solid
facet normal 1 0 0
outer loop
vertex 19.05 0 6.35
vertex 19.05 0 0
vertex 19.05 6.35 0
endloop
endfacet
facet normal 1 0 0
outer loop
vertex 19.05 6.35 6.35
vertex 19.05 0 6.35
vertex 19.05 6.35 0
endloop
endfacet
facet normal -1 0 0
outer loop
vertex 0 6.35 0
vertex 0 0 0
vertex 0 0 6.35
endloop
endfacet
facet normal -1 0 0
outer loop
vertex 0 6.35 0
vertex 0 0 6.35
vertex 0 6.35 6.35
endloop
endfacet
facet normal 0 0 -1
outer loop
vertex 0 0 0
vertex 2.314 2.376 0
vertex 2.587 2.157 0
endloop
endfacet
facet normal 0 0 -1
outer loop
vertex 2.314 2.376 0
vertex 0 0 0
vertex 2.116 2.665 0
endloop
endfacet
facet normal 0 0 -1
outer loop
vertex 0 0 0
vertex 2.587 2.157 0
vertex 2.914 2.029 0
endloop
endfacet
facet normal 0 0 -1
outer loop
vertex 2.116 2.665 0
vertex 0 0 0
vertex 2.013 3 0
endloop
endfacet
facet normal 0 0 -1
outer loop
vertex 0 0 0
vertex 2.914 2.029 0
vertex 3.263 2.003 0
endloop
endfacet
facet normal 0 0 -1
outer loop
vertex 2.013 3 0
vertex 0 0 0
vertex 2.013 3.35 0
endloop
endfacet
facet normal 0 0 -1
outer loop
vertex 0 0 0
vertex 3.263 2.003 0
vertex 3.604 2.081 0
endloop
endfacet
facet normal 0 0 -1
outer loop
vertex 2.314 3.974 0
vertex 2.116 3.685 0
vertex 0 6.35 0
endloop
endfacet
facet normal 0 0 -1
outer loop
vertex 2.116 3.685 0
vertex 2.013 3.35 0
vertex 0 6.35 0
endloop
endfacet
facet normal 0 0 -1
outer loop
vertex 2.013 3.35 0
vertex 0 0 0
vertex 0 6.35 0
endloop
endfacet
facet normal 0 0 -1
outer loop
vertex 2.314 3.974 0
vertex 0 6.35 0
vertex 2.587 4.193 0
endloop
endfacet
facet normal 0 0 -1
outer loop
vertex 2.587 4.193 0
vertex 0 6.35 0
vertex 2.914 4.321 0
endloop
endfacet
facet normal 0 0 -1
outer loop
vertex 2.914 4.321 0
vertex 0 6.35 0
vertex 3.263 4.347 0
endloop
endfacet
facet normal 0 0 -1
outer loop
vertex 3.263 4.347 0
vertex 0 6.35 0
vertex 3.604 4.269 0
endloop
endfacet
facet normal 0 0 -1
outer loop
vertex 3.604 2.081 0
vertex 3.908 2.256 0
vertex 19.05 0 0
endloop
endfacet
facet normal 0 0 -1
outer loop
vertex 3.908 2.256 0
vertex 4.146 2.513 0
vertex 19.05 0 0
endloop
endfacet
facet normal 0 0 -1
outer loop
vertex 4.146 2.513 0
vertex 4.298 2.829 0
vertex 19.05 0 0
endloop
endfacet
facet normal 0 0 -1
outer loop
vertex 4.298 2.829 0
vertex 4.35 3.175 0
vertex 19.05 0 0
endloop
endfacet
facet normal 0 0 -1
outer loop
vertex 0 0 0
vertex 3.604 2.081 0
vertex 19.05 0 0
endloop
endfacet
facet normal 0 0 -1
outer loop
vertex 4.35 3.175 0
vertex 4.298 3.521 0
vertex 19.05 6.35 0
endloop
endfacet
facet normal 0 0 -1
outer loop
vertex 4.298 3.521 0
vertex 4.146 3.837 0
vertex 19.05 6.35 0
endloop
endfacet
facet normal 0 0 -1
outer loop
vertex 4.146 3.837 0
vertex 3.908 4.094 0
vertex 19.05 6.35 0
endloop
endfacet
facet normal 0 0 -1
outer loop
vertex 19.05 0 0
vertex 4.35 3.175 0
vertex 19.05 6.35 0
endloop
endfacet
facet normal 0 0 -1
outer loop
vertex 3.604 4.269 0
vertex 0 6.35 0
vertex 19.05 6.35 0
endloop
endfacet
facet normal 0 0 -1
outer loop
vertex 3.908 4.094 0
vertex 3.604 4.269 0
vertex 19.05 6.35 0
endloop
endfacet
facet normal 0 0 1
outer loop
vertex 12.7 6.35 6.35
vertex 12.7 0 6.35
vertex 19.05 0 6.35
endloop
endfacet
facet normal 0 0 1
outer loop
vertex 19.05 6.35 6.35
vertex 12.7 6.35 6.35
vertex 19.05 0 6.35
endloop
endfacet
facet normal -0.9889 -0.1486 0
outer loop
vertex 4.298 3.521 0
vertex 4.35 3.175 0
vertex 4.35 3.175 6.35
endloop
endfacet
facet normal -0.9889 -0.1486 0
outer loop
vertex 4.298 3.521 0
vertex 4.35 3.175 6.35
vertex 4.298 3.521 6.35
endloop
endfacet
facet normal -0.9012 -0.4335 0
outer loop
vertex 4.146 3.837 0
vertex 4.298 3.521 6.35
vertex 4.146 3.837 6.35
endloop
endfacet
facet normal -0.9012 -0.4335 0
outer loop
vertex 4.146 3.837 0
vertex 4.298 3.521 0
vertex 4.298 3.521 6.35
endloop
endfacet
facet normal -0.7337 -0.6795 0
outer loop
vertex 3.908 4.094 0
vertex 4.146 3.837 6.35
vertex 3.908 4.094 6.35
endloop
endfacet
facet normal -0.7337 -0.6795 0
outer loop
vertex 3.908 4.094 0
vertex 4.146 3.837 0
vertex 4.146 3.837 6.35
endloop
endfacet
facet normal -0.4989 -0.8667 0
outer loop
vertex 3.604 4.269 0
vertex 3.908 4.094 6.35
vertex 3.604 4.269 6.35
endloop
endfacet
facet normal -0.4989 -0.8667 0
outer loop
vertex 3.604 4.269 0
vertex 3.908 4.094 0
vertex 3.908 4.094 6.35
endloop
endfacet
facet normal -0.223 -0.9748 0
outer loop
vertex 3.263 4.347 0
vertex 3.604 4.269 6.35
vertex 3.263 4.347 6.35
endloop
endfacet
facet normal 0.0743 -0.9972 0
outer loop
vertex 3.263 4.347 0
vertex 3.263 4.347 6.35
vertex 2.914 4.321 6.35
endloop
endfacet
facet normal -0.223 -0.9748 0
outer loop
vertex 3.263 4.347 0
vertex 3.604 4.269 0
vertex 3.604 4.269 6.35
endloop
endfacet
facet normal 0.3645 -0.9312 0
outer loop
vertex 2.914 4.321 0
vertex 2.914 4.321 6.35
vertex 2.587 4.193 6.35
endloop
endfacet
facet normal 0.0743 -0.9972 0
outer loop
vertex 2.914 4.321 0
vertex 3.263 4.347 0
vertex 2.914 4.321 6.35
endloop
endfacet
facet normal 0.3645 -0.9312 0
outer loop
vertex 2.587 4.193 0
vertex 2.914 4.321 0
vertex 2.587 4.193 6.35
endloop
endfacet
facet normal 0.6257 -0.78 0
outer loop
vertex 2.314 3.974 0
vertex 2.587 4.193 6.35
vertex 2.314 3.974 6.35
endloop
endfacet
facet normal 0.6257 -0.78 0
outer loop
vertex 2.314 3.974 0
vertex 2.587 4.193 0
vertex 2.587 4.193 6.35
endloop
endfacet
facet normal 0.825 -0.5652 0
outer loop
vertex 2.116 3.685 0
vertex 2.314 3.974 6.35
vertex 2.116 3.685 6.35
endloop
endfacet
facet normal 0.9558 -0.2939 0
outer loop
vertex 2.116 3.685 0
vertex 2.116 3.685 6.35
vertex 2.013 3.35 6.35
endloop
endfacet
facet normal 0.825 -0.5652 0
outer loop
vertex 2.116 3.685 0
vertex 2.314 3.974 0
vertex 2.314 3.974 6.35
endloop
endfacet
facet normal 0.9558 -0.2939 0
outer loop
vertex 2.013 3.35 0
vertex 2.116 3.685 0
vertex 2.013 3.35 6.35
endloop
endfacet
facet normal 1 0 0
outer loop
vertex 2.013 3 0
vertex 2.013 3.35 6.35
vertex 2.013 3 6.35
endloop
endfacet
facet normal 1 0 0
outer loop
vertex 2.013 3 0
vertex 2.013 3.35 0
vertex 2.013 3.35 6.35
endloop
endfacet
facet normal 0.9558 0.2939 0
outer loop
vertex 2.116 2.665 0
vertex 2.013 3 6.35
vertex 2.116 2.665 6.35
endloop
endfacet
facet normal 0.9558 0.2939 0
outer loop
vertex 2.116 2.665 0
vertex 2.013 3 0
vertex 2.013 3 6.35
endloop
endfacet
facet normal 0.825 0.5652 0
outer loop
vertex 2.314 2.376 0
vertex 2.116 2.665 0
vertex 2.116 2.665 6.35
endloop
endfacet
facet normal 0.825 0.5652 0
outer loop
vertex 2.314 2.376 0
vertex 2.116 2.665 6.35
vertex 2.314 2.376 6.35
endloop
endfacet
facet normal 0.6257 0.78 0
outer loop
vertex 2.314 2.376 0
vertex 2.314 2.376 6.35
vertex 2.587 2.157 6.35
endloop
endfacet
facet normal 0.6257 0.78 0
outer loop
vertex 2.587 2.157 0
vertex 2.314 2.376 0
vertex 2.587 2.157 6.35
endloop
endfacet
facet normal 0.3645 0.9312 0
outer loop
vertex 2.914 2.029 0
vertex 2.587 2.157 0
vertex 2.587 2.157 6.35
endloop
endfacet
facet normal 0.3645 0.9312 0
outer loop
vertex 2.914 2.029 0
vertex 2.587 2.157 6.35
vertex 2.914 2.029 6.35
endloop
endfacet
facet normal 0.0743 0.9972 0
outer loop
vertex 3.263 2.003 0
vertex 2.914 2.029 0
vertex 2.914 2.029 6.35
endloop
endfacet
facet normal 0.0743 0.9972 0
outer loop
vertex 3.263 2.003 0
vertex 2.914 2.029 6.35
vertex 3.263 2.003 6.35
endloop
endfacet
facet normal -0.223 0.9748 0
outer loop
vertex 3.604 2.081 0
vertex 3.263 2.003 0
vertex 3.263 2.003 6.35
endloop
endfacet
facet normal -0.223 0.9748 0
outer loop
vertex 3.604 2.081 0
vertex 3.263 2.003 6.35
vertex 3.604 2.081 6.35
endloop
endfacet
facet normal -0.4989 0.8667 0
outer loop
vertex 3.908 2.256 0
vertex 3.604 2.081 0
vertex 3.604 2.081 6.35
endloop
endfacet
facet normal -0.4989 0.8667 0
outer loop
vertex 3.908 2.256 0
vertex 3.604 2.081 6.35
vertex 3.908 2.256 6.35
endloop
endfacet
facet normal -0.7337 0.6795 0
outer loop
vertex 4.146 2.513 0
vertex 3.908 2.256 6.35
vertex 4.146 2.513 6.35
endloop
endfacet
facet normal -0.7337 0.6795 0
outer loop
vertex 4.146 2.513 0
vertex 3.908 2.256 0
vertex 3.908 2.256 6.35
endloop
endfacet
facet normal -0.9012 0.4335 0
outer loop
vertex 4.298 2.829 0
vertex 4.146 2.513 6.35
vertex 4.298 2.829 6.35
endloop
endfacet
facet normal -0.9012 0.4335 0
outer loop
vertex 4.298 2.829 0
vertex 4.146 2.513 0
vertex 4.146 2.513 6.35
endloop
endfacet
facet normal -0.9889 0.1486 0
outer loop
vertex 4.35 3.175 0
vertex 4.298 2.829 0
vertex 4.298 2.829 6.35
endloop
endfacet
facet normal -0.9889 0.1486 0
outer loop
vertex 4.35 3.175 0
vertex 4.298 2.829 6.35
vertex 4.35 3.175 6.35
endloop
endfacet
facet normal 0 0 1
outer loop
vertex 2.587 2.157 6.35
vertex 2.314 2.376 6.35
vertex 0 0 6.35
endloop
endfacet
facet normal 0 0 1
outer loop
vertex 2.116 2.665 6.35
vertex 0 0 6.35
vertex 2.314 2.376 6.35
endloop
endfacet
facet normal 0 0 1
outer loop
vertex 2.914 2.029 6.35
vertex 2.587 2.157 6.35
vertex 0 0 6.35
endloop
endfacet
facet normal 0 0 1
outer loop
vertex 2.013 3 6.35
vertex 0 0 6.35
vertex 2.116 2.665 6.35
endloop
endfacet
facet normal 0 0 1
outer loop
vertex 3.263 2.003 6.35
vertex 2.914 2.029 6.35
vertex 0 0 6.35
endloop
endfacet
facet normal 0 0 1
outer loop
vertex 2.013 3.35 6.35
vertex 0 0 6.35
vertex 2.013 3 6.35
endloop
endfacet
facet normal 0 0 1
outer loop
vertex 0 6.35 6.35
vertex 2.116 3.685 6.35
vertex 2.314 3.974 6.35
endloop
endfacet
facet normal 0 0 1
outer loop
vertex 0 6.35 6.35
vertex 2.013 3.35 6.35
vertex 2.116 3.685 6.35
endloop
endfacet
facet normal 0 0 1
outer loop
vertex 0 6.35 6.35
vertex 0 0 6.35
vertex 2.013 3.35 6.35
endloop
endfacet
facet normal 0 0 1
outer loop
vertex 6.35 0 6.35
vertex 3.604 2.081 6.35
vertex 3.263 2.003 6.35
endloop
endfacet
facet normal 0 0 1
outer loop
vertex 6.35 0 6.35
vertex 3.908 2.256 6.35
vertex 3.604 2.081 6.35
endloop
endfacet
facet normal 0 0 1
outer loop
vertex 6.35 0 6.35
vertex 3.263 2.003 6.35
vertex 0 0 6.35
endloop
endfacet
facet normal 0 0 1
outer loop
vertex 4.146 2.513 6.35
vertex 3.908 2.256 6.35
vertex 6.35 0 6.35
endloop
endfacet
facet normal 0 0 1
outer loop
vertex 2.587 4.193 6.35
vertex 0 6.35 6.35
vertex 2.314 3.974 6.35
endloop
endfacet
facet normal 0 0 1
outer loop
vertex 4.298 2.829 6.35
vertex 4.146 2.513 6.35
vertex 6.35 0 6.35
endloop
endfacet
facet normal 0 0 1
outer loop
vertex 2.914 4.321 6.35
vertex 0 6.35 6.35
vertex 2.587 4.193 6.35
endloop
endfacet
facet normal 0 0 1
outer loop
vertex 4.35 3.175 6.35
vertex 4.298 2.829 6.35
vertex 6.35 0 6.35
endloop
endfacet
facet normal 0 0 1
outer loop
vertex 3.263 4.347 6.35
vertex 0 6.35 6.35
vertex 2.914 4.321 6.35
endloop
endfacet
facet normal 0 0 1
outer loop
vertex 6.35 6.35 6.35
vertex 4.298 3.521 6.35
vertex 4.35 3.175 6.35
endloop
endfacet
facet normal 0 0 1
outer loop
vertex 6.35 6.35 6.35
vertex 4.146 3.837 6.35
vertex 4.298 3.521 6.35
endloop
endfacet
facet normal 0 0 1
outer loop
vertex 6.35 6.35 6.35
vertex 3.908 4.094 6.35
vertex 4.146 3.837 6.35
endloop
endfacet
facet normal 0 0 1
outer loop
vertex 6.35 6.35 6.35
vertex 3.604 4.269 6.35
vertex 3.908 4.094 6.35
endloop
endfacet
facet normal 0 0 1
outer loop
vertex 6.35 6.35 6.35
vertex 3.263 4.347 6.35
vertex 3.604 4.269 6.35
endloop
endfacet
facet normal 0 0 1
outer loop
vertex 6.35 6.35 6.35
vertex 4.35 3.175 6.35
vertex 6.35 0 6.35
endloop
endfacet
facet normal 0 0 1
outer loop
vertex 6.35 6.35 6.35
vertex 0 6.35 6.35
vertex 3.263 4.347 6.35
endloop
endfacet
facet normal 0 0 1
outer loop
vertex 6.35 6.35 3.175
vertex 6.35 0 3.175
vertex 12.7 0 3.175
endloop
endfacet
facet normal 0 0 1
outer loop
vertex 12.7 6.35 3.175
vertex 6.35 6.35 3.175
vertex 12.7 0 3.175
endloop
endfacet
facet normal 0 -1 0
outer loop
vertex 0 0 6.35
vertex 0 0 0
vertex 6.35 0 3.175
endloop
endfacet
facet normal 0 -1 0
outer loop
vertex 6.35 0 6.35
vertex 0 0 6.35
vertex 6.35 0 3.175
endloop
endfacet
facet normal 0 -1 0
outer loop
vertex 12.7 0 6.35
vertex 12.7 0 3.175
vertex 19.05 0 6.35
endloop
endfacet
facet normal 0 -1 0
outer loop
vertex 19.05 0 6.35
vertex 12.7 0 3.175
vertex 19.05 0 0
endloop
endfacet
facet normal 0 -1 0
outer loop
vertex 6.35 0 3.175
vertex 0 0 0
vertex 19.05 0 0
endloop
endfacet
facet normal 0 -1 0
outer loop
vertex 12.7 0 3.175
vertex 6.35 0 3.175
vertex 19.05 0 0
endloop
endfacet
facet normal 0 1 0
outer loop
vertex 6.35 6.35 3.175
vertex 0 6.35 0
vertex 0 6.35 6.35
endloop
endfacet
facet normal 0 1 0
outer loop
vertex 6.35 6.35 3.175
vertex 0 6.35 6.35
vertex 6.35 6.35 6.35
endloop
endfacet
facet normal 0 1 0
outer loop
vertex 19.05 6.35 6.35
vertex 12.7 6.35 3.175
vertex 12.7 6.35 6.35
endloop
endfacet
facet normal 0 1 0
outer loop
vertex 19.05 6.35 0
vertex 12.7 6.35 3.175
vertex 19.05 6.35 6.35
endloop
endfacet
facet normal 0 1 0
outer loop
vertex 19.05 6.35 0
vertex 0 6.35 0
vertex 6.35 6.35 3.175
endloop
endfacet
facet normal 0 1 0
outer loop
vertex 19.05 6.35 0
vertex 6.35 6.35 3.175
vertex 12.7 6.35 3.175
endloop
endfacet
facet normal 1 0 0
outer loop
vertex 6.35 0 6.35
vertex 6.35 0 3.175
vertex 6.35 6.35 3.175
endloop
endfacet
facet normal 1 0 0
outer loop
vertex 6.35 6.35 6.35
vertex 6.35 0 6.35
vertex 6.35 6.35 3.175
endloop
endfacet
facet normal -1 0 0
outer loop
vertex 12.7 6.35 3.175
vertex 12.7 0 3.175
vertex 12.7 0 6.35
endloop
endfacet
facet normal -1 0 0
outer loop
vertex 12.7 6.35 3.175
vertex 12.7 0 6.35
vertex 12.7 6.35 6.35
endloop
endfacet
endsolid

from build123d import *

# Parameters (mm, degrees)
F0_W     = 6.35
F0_H     = 6.35
F0_R     = 1.1751262937
F1_DEPTH = 6.35
F2_DEPTH = 3.175


# Not quite as in the source:
# - a feature names something its author has since deleted; it is built from what else it names


with BuildPart() as f1:
    # F0 (on Top) → F1 (new body)
    with BuildSketch(Plane.XY):
        with Locations((3.175, 3.175)):
            Rectangle(F0_W, F0_H)
        with Locations((3.175, 3.175)):
            Circle(F0_R, mode=Mode.SUBTRACT)
    extrude(amount=F1_DEPTH)



with BuildPart() as f1b:
    # F0 (on Top) → F1, piece 2 (new body)
    with BuildSketch(Plane.XY):
        with Locations((15.875, 3.175)):
            Rectangle(F0_W, F0_H)
    extrude(amount=F1_DEPTH)


with BuildPart() as f1_1:
    add(f1.part)

    add(f1b.part)  # F2 merges F1b
    # F0 (on Top) → F2 (join)
    with BuildSketch(Plane.XY):
        with Locations((9.525, 3.175)):
            Rectangle(F0_W, F0_H)
    extrude(amount=F2_DEPTH)


solid = f1_1.part
